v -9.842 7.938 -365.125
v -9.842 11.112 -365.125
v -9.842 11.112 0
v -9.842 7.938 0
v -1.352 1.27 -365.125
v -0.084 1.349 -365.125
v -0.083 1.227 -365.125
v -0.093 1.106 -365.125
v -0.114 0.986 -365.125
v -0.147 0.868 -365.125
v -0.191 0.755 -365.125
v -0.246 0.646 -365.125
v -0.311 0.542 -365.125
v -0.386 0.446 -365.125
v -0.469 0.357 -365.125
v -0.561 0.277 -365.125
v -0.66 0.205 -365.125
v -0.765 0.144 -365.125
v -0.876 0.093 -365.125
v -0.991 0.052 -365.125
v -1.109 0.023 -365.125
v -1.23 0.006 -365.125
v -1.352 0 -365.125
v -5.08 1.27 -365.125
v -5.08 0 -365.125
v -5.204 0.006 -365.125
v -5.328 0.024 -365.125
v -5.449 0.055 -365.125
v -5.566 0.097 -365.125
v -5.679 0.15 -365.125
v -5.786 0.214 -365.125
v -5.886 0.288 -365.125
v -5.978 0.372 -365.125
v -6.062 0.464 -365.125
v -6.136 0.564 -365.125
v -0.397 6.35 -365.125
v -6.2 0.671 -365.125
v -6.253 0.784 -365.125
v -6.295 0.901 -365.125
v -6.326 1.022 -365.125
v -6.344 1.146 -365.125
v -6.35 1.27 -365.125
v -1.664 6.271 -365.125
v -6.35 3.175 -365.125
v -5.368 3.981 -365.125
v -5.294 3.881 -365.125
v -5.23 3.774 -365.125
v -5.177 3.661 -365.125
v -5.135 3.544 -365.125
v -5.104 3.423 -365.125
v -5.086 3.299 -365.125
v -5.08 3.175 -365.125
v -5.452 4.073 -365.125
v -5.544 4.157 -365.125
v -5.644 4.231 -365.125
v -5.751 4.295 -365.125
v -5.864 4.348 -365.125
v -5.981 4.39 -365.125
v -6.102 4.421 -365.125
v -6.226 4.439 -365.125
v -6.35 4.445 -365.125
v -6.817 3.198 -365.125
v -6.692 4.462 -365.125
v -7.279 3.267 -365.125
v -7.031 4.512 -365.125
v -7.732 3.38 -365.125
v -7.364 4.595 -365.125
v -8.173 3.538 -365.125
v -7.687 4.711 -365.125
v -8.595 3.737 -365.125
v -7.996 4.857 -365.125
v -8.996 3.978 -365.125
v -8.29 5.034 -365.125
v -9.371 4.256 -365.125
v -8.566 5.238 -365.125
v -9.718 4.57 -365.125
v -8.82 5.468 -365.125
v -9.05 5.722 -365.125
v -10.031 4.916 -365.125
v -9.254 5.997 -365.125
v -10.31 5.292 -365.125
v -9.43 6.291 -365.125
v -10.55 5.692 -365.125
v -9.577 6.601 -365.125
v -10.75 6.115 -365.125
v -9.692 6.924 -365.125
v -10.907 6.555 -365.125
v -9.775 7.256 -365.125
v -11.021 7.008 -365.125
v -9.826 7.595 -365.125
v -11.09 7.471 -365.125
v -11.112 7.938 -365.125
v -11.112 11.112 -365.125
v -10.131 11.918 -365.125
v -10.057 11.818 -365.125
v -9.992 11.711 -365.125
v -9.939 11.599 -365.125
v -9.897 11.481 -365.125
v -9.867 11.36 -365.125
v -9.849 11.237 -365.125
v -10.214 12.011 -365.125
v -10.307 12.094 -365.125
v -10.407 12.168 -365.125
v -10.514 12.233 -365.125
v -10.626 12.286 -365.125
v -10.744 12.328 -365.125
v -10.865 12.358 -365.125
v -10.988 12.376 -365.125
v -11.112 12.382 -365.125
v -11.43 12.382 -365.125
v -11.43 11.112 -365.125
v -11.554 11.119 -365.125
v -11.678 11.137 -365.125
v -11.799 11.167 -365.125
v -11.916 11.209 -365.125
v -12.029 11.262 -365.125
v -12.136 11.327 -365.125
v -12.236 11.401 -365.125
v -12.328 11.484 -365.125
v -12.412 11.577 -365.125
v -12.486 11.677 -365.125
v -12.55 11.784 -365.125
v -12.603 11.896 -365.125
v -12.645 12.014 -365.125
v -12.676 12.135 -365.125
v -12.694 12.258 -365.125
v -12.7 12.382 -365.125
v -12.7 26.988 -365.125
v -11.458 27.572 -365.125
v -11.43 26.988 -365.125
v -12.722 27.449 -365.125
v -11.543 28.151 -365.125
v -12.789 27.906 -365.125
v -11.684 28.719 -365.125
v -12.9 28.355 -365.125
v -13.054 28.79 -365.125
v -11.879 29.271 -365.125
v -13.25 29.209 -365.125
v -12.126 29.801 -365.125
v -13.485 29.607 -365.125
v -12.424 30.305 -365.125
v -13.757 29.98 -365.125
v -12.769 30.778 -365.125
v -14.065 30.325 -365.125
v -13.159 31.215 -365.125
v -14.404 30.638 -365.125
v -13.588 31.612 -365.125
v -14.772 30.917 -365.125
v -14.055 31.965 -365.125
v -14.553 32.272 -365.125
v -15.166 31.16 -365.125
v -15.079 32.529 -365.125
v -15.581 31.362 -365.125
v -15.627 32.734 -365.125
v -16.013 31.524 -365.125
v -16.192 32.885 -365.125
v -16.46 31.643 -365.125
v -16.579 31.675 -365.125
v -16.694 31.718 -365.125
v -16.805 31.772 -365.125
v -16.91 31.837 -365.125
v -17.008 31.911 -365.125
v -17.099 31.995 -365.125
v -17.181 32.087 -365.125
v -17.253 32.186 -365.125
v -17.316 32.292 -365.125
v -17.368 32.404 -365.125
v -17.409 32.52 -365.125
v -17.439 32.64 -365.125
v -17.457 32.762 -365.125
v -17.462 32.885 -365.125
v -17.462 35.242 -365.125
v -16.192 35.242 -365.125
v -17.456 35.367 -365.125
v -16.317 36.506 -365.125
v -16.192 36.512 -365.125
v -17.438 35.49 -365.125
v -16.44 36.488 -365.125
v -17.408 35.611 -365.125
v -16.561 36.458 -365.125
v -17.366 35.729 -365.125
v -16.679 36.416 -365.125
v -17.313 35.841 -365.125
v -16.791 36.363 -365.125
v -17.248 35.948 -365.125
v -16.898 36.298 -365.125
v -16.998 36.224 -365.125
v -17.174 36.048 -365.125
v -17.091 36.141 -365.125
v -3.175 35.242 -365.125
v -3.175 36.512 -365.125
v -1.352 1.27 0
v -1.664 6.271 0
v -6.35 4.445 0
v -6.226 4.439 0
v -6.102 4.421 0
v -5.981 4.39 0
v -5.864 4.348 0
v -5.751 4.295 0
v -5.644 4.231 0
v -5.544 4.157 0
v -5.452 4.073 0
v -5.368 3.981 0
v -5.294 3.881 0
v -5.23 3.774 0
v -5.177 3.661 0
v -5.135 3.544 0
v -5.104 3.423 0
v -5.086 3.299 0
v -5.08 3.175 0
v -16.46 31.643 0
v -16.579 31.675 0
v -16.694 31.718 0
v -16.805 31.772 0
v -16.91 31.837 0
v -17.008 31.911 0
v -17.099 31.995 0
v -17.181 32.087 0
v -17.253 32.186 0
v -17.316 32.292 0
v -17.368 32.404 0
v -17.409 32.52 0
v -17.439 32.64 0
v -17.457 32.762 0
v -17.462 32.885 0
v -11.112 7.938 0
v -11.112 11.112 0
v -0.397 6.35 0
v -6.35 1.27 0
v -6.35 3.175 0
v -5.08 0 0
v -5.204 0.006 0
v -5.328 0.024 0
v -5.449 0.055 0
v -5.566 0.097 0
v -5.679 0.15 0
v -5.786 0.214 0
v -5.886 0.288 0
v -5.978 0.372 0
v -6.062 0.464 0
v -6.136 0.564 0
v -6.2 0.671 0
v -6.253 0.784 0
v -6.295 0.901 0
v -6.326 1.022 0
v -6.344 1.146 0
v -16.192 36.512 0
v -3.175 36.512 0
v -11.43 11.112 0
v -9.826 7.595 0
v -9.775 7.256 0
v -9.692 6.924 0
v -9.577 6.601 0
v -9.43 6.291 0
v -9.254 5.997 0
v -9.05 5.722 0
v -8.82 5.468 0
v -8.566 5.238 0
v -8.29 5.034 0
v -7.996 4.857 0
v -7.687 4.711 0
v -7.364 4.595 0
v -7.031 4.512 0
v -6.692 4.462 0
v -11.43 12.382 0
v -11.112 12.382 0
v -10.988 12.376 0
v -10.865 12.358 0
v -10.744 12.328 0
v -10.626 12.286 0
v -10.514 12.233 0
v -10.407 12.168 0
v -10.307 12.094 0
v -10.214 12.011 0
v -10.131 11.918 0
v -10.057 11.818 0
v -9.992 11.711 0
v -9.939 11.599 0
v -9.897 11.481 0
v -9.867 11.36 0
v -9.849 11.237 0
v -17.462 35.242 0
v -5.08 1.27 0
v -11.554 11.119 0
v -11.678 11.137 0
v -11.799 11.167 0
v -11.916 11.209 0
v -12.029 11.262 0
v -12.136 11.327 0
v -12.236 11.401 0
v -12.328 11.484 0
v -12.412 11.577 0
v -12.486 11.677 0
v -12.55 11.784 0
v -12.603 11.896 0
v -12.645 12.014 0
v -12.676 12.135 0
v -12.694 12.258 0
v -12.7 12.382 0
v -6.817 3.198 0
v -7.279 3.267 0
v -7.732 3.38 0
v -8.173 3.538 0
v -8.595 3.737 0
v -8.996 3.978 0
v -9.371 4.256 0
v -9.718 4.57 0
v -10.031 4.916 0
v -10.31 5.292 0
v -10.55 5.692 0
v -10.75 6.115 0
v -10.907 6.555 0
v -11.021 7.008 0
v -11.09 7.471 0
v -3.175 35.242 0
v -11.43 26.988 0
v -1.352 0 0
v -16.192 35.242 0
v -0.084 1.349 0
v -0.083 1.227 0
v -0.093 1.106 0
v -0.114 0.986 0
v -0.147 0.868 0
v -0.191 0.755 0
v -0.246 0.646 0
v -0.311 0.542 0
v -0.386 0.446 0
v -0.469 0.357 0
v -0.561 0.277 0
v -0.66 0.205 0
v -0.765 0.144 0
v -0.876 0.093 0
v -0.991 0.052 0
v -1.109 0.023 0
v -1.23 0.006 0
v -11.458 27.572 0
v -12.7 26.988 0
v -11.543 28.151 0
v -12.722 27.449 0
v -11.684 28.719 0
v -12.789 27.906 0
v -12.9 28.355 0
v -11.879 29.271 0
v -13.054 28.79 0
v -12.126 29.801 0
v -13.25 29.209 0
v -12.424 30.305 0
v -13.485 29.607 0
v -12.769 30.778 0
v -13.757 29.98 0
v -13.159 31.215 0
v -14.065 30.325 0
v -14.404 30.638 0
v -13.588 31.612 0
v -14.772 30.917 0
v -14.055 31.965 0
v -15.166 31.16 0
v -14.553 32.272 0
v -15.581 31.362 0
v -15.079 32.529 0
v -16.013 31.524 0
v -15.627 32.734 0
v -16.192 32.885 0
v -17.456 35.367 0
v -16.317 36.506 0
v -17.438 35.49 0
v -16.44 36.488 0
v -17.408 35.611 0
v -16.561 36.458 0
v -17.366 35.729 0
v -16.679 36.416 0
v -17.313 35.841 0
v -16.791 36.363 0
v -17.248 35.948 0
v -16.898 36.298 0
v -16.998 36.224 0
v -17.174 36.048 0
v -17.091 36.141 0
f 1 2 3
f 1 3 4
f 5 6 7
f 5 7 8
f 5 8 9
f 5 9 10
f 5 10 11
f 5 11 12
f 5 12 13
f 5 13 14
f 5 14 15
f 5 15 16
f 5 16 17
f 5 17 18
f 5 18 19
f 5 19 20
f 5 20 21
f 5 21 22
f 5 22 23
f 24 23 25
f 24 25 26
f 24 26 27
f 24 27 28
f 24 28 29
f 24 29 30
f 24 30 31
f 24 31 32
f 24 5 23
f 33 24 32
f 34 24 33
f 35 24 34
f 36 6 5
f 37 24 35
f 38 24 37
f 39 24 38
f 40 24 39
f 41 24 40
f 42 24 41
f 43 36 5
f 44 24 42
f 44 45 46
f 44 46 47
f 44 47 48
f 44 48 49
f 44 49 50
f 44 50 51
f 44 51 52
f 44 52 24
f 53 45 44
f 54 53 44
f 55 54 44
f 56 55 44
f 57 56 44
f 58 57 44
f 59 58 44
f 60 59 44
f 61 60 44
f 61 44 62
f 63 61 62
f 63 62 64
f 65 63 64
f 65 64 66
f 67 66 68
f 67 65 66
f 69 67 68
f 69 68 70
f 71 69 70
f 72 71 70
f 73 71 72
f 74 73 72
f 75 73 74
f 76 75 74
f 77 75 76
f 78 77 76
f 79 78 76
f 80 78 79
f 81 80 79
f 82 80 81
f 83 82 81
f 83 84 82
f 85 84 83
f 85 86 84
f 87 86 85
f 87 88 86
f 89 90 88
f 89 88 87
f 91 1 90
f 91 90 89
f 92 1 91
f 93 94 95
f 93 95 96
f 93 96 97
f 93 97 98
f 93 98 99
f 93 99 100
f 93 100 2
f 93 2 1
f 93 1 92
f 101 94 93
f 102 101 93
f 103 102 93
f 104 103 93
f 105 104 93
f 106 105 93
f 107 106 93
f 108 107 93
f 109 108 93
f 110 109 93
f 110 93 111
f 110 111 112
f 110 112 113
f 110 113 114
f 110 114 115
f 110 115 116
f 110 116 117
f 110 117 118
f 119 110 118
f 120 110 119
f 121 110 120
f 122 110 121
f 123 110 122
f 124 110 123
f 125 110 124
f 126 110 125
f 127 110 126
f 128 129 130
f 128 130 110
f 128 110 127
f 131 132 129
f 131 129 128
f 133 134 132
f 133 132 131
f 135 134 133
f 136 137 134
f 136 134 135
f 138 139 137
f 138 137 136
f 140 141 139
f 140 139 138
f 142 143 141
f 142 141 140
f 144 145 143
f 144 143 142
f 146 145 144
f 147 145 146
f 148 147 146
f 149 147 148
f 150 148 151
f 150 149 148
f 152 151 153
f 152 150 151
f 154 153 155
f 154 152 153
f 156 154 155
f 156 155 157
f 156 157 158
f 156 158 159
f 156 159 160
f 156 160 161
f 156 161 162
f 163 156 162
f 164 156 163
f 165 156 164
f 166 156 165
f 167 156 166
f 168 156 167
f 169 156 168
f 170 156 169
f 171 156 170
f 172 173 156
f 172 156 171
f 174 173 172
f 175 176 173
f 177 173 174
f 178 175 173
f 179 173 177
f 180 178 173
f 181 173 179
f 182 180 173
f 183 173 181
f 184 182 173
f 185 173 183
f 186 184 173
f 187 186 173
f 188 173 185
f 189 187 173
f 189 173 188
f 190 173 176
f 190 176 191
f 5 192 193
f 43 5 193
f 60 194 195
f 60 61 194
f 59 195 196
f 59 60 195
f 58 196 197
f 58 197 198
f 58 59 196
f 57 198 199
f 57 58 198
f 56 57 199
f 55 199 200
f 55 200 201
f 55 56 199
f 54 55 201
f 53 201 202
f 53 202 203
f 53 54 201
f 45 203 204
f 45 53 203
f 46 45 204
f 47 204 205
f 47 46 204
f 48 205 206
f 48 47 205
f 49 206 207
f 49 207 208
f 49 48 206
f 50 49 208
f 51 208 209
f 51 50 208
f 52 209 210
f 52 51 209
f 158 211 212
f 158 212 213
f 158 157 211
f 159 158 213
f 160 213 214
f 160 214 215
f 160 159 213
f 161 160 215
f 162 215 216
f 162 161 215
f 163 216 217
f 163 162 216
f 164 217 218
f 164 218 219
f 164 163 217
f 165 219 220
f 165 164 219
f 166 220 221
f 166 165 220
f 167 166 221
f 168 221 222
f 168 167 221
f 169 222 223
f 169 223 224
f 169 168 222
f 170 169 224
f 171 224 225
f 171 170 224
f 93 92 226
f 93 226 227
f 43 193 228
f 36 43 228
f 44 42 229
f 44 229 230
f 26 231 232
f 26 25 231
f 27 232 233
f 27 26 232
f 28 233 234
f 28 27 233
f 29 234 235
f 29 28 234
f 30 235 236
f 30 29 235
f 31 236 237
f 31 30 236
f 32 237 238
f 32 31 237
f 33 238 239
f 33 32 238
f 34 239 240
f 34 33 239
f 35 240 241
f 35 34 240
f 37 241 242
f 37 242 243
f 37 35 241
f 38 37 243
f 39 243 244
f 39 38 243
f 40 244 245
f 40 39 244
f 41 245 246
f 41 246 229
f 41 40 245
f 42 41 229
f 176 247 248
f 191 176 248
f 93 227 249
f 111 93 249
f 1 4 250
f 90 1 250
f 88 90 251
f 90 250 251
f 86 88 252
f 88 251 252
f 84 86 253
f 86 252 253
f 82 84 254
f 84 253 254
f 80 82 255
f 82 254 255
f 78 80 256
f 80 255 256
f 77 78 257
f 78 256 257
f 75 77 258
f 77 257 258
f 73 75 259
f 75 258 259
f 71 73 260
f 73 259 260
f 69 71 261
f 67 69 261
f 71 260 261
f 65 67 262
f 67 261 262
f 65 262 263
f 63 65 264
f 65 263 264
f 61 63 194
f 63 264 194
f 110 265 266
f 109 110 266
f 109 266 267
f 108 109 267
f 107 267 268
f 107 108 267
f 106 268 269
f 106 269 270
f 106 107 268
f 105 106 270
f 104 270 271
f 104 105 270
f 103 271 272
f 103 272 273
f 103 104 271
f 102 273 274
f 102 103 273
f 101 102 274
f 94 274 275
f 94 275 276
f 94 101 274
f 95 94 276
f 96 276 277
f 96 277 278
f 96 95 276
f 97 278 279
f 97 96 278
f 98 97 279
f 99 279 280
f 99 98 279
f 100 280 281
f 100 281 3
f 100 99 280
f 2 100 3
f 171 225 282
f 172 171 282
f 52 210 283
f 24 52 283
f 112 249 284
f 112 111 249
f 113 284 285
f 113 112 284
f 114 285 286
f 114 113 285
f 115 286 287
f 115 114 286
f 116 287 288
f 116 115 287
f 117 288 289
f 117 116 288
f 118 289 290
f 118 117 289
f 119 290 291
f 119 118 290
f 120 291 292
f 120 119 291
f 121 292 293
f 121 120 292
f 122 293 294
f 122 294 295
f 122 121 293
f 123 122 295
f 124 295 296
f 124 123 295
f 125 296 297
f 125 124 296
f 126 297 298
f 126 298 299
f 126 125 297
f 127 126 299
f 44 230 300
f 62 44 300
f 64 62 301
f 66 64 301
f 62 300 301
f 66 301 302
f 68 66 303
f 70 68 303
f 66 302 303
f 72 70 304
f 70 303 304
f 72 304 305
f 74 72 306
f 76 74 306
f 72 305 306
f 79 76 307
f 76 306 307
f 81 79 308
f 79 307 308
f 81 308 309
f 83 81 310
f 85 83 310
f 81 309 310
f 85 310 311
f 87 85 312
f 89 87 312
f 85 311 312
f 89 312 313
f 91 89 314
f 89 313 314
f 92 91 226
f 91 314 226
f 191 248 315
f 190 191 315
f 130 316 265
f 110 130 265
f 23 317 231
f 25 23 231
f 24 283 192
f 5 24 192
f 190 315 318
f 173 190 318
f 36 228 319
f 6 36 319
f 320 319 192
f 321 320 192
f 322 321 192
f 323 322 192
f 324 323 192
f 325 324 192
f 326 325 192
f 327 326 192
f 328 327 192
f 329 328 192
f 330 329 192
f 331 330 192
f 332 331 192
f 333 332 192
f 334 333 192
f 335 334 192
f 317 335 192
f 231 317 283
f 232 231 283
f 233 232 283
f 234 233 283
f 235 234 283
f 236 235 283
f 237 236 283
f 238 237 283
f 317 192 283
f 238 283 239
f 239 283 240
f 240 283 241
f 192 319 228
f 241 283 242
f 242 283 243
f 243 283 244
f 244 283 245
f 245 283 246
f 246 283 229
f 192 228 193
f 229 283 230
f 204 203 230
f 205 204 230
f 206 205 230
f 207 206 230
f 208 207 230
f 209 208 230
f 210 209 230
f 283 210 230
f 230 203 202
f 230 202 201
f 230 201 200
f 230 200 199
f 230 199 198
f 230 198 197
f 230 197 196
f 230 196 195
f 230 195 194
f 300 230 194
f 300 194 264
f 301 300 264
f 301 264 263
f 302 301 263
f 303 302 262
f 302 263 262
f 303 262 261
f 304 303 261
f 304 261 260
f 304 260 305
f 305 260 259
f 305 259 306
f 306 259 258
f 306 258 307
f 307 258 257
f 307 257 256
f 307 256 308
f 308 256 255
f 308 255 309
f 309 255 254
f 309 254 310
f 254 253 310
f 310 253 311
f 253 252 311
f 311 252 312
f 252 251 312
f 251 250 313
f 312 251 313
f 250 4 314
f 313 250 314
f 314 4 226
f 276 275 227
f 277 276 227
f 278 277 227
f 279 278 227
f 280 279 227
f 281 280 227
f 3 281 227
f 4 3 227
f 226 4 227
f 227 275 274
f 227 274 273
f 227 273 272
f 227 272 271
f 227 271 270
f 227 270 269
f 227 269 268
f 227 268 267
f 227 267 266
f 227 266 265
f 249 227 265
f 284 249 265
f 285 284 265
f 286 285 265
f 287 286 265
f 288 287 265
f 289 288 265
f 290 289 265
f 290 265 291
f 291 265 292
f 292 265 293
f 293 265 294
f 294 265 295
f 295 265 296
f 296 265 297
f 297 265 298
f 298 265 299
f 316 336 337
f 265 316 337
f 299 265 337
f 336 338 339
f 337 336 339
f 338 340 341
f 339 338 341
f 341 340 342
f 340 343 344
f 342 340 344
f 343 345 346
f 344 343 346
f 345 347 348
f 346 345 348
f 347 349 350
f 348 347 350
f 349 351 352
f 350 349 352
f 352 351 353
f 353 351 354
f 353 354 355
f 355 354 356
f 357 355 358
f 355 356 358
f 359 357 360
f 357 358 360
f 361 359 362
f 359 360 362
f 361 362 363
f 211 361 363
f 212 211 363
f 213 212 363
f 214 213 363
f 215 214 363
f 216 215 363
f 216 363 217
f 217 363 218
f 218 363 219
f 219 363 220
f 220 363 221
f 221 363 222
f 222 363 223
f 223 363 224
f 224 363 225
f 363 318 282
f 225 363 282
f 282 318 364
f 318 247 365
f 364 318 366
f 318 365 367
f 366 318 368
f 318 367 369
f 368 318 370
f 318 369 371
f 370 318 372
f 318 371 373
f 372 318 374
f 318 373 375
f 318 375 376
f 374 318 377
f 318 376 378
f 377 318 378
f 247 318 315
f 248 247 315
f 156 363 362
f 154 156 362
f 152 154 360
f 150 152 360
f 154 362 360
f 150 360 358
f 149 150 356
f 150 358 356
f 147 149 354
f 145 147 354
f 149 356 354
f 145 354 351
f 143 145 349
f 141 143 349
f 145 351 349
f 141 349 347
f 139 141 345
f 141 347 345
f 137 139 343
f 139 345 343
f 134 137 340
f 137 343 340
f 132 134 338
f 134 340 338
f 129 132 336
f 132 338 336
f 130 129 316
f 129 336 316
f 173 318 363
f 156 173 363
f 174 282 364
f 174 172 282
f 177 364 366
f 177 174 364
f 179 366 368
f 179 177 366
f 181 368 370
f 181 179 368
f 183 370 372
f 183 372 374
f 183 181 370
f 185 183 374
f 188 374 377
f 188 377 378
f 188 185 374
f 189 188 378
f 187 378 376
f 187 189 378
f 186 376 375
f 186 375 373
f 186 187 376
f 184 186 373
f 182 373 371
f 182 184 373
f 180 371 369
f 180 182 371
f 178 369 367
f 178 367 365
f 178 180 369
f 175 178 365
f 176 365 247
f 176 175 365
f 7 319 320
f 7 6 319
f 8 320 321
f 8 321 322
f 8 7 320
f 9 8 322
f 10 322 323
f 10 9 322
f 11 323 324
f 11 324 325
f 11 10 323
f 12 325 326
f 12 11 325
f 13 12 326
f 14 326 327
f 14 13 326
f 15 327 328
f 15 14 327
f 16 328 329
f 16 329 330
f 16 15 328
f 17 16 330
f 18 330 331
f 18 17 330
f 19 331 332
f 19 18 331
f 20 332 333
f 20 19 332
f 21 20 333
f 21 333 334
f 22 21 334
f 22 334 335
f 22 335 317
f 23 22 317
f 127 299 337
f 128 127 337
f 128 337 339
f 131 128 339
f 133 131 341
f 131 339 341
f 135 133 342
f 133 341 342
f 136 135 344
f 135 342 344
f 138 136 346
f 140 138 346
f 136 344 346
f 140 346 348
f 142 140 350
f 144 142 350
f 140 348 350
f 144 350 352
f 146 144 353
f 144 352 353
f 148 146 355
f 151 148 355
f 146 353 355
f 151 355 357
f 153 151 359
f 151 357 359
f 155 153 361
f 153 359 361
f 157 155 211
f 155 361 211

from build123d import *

# Parameters (mm, degrees)
EXTRUDE_THIN1_DEPTH = 365.125
FILLET1_R           = 1.27


with BuildPart() as part:
    # Sketch1 → Extrude-Thin1 (new body)
    with BuildSketch(Plane.XY):
        with BuildLine():
            Line((-0.396875, 6.35), (0, 0))
            Line((0, 0), (-6.35, 0))
            Line((-6.35, 0), (-6.35, 3.175))
            ThreePointArc((-6.35, 3.175), (-9.717596045, 4.569903955), (-11.1125, 7.9375))
            Line((-11.1125, 7.9375), (-11.1125, 11.1125))
            Line((-11.1125, 11.1125), (-12.7, 11.1125))
            Line((-12.7, 11.1125), (-12.7, 26.9875))
            ThreePointArc((-12.7, 26.9875), (-14.094903955, 30.355096045), (-17.4625, 31.75))
            Line((-17.4625, 31.75), (-17.4625, 36.5125))
            Line((-17.4625, 36.5125), (-3.175, 36.5125))
            Line((-3.175, 36.5125), (-3.175, 35.2425))
            Line((-3.175, 35.2425), (-16.1925, 35.2425))
            Line((-16.1925, 35.2425), (-16.1925, 32.88480076))
            ThreePointArc((-16.1925, 32.88480076), (-12.769295804, 30.777604303), (-11.43, 26.9875))
            Line((-11.43, 26.9875), (-11.43, 12.3825))
            Line((-11.43, 12.3825), (-9.8425, 12.3825))
            Line((-9.8425, 12.3825), (-9.8425, 7.9375))
            ThreePointArc((-9.8425, 7.9375), (-8.320035691, 5.053663038), (-5.08, 4.684093132))
            Line((-5.08, 4.684093132), (-5.08, 1.27))
            Line((-5.08, 1.27), (-1.351853051, 1.27))
            Line((-1.351853051, 1.27), (-1.664401775, 6.270779577))
            Line((-1.664401775, 6.270779577), (-0.396875, 6.35))
        make_face()
    extrude(amount=-EXTRUDE_THIN1_DEPTH)

    # Fillet1
    fillet1_edges = [part.edges().sort_by_distance(p)[0] for p in [
        (-9.8425, 12.3825, -182.5625),
        (-5.08, 4.684093132, -182.5625),
        (0, 0, -182.5625),
        (-6.35, 0, -182.5625),
        (-12.7, 11.1125, -182.5625),
        (-17.4625, 31.75, -182.5625),
        (-17.4625, 36.5125, -182.5625),
    ]]
    fillet(fillet1_edges, radius=FILLET1_R)


solid = part.part
